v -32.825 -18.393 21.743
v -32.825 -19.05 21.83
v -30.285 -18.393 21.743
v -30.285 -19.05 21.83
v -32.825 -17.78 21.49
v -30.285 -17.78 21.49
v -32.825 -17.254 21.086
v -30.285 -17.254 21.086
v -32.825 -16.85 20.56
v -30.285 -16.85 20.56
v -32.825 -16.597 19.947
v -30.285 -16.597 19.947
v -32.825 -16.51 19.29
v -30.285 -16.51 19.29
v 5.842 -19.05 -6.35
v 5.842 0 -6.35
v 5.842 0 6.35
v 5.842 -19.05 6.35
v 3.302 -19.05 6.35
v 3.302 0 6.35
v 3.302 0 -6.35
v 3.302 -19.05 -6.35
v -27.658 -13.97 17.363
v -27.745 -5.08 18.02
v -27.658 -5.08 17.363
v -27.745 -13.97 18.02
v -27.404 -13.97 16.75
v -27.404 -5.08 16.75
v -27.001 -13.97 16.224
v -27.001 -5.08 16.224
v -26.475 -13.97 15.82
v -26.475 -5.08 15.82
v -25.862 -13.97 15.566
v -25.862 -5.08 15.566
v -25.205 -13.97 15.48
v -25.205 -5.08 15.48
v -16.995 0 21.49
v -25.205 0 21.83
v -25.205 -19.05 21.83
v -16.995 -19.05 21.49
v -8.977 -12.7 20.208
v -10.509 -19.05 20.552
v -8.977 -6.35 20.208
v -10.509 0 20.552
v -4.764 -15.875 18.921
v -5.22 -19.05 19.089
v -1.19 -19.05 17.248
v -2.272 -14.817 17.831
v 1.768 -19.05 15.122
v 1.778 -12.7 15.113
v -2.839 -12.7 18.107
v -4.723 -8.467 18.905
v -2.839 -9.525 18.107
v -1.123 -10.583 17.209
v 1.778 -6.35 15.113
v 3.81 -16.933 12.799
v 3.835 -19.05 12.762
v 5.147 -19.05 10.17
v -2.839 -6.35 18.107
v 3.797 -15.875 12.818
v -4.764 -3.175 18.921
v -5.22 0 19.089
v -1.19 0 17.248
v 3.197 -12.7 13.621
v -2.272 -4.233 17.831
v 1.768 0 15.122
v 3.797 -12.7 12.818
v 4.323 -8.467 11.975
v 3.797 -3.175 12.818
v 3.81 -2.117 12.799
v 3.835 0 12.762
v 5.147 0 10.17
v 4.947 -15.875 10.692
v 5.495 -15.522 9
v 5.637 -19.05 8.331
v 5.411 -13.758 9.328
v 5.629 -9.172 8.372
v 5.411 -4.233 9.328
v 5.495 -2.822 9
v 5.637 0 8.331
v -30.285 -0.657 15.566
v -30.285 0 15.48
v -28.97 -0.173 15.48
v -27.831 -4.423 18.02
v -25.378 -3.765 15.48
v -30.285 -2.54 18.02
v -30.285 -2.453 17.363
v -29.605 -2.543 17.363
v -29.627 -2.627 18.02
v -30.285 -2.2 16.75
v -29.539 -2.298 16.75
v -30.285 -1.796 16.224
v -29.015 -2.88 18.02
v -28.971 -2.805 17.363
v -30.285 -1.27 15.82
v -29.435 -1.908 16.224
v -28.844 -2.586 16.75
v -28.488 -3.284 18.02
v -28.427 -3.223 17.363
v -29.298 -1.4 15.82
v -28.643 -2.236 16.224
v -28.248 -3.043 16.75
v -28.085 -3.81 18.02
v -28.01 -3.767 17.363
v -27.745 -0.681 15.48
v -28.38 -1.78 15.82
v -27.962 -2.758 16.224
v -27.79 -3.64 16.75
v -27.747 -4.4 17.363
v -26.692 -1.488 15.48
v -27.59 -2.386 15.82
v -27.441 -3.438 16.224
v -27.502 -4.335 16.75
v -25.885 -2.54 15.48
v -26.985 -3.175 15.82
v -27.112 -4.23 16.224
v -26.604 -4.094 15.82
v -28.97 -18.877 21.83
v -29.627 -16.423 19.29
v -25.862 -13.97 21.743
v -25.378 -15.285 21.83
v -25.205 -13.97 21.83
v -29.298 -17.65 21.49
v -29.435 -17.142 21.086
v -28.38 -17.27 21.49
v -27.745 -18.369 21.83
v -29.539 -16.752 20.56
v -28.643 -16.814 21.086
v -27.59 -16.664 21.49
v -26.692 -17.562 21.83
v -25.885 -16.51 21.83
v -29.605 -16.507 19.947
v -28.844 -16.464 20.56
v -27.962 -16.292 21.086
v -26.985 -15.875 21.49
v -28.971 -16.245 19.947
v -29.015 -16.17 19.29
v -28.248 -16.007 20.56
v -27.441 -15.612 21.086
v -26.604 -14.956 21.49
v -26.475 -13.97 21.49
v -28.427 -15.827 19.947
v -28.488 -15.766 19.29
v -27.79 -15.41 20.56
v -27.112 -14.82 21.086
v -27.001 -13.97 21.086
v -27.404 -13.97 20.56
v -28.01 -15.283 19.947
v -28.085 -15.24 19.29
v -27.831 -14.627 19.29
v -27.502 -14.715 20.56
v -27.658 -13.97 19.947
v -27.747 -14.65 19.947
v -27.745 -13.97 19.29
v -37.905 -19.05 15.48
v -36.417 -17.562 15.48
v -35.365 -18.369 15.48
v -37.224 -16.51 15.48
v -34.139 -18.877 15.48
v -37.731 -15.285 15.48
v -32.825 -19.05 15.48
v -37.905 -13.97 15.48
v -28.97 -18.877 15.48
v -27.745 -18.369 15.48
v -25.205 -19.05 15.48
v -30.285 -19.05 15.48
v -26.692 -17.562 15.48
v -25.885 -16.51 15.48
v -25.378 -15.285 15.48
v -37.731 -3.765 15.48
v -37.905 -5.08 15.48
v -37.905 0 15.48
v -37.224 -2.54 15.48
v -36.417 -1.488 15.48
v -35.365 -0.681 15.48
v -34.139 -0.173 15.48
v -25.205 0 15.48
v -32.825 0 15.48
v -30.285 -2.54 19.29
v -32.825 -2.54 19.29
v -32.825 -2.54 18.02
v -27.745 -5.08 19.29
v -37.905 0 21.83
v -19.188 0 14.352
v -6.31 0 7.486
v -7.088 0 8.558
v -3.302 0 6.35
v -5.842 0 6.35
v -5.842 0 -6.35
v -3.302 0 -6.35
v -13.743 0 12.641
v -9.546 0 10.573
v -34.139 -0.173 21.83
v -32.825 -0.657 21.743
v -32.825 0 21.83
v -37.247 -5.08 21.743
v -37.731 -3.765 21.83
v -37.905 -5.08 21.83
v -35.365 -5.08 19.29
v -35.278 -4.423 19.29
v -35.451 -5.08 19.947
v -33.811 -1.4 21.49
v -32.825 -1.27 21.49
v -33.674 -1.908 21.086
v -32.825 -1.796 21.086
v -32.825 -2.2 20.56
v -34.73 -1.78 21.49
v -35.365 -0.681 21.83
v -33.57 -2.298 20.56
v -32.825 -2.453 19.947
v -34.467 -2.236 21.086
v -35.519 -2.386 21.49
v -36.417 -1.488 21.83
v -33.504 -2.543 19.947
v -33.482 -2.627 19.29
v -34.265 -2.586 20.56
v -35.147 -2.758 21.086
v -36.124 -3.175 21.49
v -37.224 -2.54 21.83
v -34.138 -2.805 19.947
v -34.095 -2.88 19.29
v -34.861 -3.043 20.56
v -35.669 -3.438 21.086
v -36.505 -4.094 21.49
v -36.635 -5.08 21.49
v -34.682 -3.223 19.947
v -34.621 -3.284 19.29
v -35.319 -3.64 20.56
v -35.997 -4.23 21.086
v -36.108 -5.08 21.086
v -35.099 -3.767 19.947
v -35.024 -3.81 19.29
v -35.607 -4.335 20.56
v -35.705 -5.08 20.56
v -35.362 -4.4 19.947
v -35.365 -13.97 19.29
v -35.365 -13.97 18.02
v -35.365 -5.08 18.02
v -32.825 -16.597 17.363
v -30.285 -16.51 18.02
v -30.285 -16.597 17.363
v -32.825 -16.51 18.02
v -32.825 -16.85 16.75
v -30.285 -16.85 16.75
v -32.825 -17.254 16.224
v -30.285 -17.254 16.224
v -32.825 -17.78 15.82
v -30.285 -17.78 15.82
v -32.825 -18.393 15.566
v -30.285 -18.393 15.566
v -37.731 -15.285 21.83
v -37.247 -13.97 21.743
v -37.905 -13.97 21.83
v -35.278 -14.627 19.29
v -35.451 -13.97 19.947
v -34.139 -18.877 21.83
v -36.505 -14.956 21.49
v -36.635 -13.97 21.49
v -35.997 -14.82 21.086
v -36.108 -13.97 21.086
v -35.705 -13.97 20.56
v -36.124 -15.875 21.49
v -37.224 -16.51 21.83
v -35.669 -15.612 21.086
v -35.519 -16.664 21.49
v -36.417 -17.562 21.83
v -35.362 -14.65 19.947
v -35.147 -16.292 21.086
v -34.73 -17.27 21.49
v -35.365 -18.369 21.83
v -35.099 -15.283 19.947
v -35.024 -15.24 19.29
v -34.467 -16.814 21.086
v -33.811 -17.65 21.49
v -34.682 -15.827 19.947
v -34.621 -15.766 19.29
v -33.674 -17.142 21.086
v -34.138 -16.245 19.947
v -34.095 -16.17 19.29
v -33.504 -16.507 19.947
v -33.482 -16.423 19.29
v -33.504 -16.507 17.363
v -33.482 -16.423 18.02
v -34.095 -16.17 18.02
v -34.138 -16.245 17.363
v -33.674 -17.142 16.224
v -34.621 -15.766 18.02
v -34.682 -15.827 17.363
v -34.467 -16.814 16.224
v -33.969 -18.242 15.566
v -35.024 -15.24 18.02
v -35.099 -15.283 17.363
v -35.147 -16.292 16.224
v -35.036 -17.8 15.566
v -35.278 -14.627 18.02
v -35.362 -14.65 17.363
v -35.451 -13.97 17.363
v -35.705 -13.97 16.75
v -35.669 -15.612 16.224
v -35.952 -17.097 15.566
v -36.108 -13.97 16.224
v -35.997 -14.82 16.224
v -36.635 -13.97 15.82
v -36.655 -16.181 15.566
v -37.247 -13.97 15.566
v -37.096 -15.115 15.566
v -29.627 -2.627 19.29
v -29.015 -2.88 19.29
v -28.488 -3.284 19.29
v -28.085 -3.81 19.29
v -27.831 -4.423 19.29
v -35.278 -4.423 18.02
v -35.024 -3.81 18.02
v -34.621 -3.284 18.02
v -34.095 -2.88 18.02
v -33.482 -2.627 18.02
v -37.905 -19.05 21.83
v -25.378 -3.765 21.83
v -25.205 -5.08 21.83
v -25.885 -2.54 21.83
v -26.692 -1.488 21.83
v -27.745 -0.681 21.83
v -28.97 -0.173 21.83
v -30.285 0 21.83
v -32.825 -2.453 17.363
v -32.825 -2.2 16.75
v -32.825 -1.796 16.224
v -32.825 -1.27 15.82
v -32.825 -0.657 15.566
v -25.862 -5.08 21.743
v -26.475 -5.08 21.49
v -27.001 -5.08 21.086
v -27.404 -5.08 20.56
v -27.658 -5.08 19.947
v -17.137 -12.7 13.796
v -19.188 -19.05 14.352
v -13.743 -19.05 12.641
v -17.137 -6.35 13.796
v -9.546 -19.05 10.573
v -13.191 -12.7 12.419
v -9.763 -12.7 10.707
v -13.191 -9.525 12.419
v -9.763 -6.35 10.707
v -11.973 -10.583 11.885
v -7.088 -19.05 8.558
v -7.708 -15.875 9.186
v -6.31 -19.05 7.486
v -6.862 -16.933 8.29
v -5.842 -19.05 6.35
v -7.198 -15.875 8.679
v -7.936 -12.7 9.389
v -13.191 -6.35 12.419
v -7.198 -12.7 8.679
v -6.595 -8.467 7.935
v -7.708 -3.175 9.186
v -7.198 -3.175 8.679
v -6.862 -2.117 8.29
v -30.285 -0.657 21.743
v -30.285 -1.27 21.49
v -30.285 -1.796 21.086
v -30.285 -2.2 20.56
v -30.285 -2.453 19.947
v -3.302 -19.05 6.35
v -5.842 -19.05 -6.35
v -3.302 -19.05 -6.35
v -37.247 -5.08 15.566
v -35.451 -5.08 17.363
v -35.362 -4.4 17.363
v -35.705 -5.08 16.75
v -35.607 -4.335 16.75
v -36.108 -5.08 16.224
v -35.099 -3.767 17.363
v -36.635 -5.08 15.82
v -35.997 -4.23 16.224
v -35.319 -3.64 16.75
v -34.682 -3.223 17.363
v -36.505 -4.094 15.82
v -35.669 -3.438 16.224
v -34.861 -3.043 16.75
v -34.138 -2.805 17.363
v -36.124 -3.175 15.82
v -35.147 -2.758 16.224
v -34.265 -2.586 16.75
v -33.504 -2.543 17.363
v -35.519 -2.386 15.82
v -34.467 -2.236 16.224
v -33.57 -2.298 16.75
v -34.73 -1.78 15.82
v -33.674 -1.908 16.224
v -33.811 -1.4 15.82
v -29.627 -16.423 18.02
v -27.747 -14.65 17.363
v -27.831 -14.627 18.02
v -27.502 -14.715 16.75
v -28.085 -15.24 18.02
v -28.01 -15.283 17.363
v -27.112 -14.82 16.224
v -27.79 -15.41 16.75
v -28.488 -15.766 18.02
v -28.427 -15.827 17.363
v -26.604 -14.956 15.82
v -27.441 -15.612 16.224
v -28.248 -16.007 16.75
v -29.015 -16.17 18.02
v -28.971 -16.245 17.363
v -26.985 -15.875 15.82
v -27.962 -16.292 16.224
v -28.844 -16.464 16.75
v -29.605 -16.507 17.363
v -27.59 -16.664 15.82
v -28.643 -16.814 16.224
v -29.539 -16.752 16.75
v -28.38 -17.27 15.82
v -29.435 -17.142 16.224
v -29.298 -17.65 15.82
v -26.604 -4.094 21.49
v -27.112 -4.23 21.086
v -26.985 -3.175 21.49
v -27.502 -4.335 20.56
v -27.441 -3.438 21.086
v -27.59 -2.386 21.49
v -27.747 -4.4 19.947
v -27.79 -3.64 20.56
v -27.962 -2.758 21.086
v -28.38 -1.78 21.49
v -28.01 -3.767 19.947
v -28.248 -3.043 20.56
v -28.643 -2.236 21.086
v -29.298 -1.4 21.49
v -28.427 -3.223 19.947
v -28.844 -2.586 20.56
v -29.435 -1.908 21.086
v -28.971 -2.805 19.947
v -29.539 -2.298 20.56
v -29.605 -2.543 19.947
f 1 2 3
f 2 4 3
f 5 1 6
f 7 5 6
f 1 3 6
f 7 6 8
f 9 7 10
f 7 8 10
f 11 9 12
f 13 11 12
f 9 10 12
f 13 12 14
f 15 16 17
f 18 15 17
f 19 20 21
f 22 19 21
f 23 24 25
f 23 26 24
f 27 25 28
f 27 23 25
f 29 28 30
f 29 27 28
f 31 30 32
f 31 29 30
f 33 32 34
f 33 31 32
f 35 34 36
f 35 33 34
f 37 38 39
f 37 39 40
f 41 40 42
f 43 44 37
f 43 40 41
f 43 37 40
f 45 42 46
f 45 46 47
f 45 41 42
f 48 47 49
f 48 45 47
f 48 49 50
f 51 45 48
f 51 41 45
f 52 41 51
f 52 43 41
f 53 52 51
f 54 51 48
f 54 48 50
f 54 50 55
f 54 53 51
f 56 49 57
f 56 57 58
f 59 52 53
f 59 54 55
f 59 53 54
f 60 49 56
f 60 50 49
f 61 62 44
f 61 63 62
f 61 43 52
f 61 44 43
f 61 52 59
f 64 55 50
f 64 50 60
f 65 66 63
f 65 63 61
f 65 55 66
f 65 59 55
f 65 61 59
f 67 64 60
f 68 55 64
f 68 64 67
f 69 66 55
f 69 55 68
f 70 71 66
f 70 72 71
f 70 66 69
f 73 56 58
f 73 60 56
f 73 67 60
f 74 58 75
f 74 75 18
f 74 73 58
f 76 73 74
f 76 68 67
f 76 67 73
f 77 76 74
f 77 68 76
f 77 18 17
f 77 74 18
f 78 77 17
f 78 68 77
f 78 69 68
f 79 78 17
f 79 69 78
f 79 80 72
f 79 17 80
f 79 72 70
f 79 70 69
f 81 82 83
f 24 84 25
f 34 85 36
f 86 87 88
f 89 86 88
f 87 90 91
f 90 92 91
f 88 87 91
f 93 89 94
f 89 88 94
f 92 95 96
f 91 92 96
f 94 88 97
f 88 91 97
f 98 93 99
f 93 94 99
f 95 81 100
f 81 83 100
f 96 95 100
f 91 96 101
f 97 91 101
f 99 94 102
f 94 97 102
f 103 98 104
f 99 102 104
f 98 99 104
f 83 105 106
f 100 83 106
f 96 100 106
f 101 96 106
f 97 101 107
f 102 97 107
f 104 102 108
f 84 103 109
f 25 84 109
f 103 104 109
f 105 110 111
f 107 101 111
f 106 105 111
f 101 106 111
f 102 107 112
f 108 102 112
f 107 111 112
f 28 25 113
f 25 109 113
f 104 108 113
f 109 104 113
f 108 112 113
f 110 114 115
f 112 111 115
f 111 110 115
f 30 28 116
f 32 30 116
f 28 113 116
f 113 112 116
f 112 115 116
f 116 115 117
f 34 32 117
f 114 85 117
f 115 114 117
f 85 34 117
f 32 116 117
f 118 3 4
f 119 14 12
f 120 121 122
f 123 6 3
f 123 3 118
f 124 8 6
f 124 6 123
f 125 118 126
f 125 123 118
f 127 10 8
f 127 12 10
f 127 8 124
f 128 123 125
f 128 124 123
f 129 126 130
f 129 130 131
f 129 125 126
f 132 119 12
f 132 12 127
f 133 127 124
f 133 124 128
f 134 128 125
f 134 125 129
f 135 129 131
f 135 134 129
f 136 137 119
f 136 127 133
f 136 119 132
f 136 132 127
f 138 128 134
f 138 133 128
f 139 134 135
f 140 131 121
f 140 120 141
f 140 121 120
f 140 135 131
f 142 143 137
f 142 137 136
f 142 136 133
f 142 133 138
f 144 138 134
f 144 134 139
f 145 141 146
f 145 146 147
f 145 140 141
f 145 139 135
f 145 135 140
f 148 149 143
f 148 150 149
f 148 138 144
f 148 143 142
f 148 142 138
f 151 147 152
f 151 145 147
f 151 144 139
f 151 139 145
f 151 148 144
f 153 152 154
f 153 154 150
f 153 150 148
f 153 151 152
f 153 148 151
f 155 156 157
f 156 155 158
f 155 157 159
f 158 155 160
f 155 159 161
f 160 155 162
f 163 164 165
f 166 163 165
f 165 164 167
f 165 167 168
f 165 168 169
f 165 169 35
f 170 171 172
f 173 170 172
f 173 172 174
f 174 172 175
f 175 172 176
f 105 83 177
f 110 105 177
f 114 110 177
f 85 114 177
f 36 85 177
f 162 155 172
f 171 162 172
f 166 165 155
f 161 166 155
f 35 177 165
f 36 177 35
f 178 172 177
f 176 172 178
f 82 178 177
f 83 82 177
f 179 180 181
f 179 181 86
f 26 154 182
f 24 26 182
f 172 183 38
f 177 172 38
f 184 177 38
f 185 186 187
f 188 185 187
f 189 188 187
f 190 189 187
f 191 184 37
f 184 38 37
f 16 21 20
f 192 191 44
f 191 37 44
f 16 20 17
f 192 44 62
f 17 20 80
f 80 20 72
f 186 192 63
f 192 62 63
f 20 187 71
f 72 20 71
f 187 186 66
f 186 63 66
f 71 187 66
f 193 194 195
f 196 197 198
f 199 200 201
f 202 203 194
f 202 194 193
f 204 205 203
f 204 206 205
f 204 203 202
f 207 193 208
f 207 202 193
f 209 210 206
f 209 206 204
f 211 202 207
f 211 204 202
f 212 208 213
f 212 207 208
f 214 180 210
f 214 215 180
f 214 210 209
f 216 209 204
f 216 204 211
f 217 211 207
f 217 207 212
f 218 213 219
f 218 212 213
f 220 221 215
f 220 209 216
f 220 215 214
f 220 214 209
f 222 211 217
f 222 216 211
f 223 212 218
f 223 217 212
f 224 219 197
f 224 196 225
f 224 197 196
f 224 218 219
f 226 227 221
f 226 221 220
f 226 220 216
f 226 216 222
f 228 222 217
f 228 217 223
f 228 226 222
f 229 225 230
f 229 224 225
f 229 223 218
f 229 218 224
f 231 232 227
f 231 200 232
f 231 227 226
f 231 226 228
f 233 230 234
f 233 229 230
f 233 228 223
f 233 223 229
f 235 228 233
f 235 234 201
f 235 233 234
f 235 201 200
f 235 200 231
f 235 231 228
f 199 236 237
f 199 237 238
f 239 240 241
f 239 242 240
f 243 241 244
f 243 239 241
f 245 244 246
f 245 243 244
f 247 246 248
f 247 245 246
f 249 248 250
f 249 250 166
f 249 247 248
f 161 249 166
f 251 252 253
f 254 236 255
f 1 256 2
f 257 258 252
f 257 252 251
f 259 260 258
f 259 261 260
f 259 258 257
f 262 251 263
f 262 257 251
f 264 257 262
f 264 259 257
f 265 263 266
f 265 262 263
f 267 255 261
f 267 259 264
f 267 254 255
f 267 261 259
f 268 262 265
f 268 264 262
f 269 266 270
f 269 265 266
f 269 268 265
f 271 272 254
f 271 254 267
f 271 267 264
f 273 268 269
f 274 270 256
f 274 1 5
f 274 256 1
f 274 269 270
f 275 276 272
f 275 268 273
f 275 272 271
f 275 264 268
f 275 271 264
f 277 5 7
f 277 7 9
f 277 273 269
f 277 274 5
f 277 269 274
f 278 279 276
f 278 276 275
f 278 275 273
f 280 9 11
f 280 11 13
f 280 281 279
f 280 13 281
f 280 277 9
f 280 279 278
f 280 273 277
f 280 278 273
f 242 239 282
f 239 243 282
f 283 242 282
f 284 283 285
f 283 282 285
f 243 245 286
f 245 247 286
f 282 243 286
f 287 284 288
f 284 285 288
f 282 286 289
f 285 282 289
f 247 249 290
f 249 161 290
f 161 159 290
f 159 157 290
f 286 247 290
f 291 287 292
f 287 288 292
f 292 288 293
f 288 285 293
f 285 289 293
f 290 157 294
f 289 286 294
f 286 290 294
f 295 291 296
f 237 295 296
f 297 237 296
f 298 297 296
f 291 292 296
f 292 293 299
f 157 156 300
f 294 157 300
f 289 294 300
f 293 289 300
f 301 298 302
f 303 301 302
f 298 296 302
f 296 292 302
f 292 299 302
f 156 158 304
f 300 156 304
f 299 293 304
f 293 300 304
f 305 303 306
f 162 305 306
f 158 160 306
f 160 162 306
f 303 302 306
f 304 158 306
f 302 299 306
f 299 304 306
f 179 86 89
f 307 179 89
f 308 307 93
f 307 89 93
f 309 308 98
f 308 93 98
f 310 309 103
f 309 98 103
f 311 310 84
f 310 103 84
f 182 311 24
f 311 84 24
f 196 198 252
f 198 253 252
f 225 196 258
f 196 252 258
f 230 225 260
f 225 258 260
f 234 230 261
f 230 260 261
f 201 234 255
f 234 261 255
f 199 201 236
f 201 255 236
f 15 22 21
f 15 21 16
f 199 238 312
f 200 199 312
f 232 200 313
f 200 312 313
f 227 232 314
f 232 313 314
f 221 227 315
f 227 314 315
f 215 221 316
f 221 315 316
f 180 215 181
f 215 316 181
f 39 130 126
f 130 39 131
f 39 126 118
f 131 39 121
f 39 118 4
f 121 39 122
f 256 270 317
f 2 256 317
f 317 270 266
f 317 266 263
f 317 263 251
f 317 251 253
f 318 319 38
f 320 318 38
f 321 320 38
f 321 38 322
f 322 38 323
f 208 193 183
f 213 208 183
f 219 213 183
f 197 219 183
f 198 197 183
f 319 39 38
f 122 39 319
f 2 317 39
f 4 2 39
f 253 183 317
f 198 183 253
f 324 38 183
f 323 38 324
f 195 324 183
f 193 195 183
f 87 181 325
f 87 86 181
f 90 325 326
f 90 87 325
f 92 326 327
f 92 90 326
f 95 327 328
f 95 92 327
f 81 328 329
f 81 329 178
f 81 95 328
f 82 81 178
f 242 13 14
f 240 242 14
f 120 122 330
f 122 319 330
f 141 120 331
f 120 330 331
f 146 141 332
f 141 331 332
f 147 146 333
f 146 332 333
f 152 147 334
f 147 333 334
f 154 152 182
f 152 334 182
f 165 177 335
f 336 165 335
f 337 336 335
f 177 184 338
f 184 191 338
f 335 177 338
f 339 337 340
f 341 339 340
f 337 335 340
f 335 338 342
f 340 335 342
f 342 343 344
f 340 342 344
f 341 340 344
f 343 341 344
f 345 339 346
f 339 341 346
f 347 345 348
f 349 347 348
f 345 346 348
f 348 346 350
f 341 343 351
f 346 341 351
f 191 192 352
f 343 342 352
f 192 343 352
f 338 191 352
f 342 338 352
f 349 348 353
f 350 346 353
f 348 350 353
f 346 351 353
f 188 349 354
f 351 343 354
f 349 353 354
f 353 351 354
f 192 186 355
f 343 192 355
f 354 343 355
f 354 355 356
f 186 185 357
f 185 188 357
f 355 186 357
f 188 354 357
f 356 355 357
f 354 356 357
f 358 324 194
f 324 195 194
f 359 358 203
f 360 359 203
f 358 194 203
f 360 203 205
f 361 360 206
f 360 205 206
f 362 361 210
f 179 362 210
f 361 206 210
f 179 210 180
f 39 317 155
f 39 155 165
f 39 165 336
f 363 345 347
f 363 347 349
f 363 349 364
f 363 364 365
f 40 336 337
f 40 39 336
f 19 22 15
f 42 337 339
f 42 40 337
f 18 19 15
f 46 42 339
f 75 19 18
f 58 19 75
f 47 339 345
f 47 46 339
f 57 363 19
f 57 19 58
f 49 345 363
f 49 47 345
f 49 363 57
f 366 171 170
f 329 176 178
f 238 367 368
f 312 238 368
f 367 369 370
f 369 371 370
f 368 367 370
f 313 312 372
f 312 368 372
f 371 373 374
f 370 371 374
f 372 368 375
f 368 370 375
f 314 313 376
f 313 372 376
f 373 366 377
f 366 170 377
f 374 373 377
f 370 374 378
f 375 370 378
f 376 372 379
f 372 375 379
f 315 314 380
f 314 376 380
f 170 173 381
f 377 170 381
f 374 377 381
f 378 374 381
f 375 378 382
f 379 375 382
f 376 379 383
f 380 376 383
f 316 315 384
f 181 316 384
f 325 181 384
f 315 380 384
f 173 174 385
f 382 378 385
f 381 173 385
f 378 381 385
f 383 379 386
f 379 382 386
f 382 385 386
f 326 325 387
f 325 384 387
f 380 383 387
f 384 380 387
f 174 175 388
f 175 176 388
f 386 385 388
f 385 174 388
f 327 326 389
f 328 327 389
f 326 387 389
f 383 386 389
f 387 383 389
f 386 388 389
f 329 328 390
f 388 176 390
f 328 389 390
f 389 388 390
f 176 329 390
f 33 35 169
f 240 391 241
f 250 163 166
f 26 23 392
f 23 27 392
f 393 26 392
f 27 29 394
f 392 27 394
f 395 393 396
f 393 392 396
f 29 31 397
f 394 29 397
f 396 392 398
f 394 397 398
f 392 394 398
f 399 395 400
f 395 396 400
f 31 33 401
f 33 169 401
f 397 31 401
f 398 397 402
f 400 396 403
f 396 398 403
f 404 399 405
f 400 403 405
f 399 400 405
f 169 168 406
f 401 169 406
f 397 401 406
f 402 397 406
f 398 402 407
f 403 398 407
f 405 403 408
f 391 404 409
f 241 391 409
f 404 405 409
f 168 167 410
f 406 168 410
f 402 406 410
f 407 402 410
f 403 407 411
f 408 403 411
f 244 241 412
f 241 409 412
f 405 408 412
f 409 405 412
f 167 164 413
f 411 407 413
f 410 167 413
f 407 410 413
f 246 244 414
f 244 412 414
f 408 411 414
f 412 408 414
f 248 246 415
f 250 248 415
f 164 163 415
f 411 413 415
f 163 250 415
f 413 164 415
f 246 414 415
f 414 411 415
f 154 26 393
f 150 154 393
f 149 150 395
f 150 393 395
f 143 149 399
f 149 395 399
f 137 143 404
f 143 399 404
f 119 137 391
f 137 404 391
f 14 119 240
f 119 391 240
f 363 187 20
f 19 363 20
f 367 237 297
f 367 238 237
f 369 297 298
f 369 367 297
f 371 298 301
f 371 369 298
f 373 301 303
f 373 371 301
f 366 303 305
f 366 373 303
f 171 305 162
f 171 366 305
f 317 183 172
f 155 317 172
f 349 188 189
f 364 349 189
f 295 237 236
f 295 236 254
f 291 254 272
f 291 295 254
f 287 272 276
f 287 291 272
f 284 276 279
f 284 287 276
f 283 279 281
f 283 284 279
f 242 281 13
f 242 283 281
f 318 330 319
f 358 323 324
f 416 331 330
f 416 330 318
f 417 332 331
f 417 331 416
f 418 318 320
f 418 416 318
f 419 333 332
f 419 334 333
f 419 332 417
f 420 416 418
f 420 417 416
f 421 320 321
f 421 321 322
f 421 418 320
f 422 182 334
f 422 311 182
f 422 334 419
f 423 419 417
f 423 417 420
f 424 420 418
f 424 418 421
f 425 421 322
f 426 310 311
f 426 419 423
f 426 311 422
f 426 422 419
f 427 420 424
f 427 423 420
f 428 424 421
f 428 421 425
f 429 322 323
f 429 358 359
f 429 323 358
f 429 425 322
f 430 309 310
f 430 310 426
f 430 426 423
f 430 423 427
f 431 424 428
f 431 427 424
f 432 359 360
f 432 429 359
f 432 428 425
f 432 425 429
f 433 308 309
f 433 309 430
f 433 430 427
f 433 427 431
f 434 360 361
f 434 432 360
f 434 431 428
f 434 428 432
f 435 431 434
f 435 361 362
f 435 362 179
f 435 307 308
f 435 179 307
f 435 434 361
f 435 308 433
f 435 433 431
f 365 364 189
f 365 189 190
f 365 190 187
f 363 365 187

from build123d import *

# Parameters (mm, degrees)
F1_DEPTH = 19.05
F2_W     = 7.62
F2_H     = 13.97
F3_DEPTH = 6.35
F4_R     = 2.54
F5_R     = 2.53999
F6_R     = 2.53999


# Not quite as in the source:
# - a fillet or chamfer is up to 0.001 mm smaller than in the source, because OpenCascade refuses the exact size


with BuildPart() as f1:
    # F0 (on Front) → F1 (new body)
    with BuildSketch(Plane.XZ):
        with BuildLine():
            Line((-3.302, 6.35), (3.302, 6.35))
            Line((3.302, 6.35), (3.302, -6.35))
            Line((3.302, -6.35), (5.842, -6.35))
            Line((5.842, -6.35), (5.842, 6.35))
            add(Edge.make_bspline(
                [(-25.2045363516, 21.8299297452), (-6.6467649303, 21.8811389059), (5.5305822752, 17.0102007687), (5.842, 6.35)],
                knots=[0, 0, 0, 0, 34.6917229948, 34.6917229948, 34.6917229948, 34.6917229948], degree=3))
            Line((-25.2045363516, 21.8299297452), (-37.9045363516, 21.8299297452))
            Line((-37.9045363516, 21.8299297452), (-37.9045363516, 15.4799297452))
            Line((-37.9045363516, 15.4799297452), (-25.2045363516, 15.4799297452))
            add(Edge.make_bspline(
                [(-25.2045363516, 15.4799297452), (-17.7111625671, 14.5441424102), (-7.1151247248, 11.2962136045), (-5.842, 6.35)],
                knots=[0, 0, 0, 0, 21.4070883382, 21.4070883382, 21.4070883382, 21.4070883382], degree=3))
            Line((-5.842, 6.35), (-5.842, -6.35))
            Line((-5.842, -6.35), (-3.302, -6.35))
            Line((-3.302, -6.35), (-3.302, 6.35))
        make_face()
    extrude(amount=F1_DEPTH)

    # F2 (on face) → F3 (cut)
    with BuildSketch(Plane.XY.offset(21.8299297452)):
        with Locations((-31.5545363516, -9.525)):
            Rectangle(F2_W, F2_H)
    extrude(amount=-F3_DEPTH, mode=Mode.SUBTRACT)

    # F4
    f4_edges = [f1.edges().sort_by_distance(p)[0] for p in [
        (-27.744536, -2.54, 18.65493),
        (-35.364536, -2.54, 18.65493),
        (-35.364536, -16.51, 18.65493),
        (-27.744536, -16.51, 18.65493),
    ]]
    fillet(f4_edges, radius=F4_R)

    # F5 (radius 2.54 in the source; OpenCascade refuses exactly that, so slightly less here)
    f5_edges = [f1.edges().sort_by_distance(p)[0] for p in [
        (-35.364536, -9.525, 15.47993),
        (-34.620588, -15.766051, 15.47993),
        (-31.554536, -16.51, 15.47993),
        (-28.488485, -15.766051, 15.47993),
        (-27.744536, -9.525, 15.47993),
        (-31.554536, -2.54, 15.47993),
        (-34.620588, -3.283949, 15.47993),
        (-28.488485, -3.283949, 15.47993),
    ]]
    fillet(f5_edges, radius=F5_R)

    # F6 (radius 2.54 in the source; OpenCascade refuses exactly that, so slightly less here)
    f6_edges = [f1.edges().sort_by_distance(p)[0] for p in [
        (-31.554536, -16.51, 21.82993),
        (-34.620588, -15.766051, 21.82993),
        (-28.488485, -15.766051, 21.82993),
        (-35.364536, -9.525, 21.82993),
        (-27.744536, -9.525, 21.82993),
        (-28.488485, -3.283949, 21.82993),
        (-31.554536, -2.54, 21.82993),
        (-34.620588, -3.283949, 21.82993),
    ]]
    fillet(f6_edges, radius=F6_R)


solid = f1.part
